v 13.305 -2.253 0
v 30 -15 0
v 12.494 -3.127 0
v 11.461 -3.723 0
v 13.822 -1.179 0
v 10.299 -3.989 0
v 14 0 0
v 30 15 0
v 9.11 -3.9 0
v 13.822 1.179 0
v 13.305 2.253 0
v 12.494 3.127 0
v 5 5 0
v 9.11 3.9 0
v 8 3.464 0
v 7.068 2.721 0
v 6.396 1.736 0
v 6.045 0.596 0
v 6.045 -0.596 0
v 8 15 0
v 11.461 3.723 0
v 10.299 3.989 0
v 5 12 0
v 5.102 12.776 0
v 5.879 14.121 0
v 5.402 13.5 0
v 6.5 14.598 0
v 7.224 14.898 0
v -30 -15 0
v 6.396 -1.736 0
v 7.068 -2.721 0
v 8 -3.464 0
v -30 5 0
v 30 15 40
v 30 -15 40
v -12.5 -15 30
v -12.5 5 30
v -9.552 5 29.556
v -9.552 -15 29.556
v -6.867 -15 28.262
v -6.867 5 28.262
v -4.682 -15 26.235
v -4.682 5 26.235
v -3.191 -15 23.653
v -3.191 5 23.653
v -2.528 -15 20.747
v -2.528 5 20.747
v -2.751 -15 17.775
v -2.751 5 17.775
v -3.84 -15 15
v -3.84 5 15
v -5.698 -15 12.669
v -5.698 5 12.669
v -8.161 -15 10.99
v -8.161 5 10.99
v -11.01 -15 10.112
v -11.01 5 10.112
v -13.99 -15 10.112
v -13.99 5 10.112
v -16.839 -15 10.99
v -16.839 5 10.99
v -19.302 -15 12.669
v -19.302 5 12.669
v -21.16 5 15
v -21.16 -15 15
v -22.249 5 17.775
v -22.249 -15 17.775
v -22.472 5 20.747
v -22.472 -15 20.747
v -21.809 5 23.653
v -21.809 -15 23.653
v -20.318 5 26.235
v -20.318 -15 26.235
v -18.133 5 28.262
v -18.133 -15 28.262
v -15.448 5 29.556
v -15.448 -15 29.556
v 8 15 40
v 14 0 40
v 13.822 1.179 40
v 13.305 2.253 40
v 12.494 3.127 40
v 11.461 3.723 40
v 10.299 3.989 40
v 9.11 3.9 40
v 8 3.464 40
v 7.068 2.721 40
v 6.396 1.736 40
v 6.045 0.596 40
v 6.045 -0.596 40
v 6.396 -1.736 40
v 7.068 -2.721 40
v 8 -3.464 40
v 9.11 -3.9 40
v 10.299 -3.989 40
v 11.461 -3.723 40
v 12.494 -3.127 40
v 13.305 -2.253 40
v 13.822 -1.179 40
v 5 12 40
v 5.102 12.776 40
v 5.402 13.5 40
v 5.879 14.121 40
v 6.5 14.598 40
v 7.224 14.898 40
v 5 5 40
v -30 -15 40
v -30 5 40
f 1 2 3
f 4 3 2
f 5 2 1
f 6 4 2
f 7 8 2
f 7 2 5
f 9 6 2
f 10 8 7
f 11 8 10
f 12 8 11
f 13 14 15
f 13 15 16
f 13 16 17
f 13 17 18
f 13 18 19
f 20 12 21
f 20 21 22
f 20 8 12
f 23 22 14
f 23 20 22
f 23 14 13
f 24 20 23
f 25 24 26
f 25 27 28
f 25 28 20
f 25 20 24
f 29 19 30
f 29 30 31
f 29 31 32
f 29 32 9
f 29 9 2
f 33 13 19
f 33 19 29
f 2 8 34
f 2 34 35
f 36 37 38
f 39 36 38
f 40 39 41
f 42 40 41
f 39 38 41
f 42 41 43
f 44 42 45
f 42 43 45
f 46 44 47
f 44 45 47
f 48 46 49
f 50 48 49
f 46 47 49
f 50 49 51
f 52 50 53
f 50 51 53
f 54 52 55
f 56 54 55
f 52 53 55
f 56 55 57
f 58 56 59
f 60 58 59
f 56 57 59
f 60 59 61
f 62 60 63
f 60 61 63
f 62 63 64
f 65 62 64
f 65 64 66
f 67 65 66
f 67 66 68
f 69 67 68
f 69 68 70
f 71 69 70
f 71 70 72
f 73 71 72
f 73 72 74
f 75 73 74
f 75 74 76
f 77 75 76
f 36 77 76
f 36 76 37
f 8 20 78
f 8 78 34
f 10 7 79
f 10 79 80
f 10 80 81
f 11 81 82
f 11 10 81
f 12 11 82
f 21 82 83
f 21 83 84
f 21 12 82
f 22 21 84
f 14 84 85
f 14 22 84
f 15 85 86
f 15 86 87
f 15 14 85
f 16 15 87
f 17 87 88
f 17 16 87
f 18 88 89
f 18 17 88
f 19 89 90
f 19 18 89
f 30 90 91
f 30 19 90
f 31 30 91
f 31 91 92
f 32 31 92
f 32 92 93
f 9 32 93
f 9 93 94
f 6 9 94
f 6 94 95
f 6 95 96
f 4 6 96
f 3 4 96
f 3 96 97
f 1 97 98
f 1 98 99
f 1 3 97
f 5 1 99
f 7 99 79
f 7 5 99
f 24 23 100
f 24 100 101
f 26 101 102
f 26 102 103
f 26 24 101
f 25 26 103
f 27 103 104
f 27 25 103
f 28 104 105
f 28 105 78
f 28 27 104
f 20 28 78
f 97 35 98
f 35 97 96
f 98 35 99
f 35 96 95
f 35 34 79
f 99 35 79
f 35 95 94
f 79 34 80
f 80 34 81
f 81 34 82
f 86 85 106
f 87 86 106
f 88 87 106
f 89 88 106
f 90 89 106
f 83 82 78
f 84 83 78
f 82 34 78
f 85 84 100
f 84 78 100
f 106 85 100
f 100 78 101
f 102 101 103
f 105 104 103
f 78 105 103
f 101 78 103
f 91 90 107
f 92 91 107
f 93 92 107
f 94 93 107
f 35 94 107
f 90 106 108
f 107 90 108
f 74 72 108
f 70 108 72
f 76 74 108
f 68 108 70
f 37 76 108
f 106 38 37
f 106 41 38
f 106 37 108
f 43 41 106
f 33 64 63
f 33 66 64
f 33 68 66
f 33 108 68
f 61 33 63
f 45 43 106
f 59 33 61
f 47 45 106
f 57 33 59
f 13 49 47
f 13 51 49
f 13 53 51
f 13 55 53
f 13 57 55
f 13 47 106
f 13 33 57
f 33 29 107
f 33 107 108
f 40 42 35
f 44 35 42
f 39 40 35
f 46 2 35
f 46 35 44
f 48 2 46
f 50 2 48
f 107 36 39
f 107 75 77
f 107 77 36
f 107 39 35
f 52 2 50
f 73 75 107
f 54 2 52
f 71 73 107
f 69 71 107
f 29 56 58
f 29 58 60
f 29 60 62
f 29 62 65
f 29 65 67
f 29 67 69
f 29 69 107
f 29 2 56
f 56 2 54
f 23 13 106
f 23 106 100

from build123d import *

# Parameters (mm, degrees)
SKETCH_1_R          = 4
EXTRUDE_1_DEPTH     = 40
CUT_EXTRUDE_START   = 5
SKETCH_2_R          = 10
CUT_EXTRUDE_1_DEPTH = 40


with BuildPart() as part:
    # 草图1 → 凸台-拉伸1 (new body)
    with BuildSketch(Plane.XY):
        with BuildLine():
            Line((8, 15), (30, 15))
            Line((30, 15), (30, -15))
            Line((30, -15), (-30, -15))
            Line((-30, -15), (-30, 5))
            Line((-30, 5), (5, 5))
            Line((5, 5), (5, 12))
            ThreePointArc((5, 12), (5.878679656, 14.121320344), (8, 15))
        make_face()
        with Locations((10, 0)):
            Circle(SKETCH_1_R, mode=Mode.SUBTRACT)
    extrude(amount=EXTRUDE_1_DEPTH)

    # 草图2 → 切除-拉伸1 (cut)
    with BuildSketch(Plane(origin=(0, 0, 0), x_dir=(1, 0, 0), z_dir=(0, 1, 0)).offset(CUT_EXTRUDE_START)):
        with Locations(Location((-12.5, -20, 0), (0, 0, 270))):
            Circle(SKETCH_2_R)
    extrude(amount=-CUT_EXTRUDE_1_DEPTH, mode=Mode.SUBTRACT)


solid = part.part
